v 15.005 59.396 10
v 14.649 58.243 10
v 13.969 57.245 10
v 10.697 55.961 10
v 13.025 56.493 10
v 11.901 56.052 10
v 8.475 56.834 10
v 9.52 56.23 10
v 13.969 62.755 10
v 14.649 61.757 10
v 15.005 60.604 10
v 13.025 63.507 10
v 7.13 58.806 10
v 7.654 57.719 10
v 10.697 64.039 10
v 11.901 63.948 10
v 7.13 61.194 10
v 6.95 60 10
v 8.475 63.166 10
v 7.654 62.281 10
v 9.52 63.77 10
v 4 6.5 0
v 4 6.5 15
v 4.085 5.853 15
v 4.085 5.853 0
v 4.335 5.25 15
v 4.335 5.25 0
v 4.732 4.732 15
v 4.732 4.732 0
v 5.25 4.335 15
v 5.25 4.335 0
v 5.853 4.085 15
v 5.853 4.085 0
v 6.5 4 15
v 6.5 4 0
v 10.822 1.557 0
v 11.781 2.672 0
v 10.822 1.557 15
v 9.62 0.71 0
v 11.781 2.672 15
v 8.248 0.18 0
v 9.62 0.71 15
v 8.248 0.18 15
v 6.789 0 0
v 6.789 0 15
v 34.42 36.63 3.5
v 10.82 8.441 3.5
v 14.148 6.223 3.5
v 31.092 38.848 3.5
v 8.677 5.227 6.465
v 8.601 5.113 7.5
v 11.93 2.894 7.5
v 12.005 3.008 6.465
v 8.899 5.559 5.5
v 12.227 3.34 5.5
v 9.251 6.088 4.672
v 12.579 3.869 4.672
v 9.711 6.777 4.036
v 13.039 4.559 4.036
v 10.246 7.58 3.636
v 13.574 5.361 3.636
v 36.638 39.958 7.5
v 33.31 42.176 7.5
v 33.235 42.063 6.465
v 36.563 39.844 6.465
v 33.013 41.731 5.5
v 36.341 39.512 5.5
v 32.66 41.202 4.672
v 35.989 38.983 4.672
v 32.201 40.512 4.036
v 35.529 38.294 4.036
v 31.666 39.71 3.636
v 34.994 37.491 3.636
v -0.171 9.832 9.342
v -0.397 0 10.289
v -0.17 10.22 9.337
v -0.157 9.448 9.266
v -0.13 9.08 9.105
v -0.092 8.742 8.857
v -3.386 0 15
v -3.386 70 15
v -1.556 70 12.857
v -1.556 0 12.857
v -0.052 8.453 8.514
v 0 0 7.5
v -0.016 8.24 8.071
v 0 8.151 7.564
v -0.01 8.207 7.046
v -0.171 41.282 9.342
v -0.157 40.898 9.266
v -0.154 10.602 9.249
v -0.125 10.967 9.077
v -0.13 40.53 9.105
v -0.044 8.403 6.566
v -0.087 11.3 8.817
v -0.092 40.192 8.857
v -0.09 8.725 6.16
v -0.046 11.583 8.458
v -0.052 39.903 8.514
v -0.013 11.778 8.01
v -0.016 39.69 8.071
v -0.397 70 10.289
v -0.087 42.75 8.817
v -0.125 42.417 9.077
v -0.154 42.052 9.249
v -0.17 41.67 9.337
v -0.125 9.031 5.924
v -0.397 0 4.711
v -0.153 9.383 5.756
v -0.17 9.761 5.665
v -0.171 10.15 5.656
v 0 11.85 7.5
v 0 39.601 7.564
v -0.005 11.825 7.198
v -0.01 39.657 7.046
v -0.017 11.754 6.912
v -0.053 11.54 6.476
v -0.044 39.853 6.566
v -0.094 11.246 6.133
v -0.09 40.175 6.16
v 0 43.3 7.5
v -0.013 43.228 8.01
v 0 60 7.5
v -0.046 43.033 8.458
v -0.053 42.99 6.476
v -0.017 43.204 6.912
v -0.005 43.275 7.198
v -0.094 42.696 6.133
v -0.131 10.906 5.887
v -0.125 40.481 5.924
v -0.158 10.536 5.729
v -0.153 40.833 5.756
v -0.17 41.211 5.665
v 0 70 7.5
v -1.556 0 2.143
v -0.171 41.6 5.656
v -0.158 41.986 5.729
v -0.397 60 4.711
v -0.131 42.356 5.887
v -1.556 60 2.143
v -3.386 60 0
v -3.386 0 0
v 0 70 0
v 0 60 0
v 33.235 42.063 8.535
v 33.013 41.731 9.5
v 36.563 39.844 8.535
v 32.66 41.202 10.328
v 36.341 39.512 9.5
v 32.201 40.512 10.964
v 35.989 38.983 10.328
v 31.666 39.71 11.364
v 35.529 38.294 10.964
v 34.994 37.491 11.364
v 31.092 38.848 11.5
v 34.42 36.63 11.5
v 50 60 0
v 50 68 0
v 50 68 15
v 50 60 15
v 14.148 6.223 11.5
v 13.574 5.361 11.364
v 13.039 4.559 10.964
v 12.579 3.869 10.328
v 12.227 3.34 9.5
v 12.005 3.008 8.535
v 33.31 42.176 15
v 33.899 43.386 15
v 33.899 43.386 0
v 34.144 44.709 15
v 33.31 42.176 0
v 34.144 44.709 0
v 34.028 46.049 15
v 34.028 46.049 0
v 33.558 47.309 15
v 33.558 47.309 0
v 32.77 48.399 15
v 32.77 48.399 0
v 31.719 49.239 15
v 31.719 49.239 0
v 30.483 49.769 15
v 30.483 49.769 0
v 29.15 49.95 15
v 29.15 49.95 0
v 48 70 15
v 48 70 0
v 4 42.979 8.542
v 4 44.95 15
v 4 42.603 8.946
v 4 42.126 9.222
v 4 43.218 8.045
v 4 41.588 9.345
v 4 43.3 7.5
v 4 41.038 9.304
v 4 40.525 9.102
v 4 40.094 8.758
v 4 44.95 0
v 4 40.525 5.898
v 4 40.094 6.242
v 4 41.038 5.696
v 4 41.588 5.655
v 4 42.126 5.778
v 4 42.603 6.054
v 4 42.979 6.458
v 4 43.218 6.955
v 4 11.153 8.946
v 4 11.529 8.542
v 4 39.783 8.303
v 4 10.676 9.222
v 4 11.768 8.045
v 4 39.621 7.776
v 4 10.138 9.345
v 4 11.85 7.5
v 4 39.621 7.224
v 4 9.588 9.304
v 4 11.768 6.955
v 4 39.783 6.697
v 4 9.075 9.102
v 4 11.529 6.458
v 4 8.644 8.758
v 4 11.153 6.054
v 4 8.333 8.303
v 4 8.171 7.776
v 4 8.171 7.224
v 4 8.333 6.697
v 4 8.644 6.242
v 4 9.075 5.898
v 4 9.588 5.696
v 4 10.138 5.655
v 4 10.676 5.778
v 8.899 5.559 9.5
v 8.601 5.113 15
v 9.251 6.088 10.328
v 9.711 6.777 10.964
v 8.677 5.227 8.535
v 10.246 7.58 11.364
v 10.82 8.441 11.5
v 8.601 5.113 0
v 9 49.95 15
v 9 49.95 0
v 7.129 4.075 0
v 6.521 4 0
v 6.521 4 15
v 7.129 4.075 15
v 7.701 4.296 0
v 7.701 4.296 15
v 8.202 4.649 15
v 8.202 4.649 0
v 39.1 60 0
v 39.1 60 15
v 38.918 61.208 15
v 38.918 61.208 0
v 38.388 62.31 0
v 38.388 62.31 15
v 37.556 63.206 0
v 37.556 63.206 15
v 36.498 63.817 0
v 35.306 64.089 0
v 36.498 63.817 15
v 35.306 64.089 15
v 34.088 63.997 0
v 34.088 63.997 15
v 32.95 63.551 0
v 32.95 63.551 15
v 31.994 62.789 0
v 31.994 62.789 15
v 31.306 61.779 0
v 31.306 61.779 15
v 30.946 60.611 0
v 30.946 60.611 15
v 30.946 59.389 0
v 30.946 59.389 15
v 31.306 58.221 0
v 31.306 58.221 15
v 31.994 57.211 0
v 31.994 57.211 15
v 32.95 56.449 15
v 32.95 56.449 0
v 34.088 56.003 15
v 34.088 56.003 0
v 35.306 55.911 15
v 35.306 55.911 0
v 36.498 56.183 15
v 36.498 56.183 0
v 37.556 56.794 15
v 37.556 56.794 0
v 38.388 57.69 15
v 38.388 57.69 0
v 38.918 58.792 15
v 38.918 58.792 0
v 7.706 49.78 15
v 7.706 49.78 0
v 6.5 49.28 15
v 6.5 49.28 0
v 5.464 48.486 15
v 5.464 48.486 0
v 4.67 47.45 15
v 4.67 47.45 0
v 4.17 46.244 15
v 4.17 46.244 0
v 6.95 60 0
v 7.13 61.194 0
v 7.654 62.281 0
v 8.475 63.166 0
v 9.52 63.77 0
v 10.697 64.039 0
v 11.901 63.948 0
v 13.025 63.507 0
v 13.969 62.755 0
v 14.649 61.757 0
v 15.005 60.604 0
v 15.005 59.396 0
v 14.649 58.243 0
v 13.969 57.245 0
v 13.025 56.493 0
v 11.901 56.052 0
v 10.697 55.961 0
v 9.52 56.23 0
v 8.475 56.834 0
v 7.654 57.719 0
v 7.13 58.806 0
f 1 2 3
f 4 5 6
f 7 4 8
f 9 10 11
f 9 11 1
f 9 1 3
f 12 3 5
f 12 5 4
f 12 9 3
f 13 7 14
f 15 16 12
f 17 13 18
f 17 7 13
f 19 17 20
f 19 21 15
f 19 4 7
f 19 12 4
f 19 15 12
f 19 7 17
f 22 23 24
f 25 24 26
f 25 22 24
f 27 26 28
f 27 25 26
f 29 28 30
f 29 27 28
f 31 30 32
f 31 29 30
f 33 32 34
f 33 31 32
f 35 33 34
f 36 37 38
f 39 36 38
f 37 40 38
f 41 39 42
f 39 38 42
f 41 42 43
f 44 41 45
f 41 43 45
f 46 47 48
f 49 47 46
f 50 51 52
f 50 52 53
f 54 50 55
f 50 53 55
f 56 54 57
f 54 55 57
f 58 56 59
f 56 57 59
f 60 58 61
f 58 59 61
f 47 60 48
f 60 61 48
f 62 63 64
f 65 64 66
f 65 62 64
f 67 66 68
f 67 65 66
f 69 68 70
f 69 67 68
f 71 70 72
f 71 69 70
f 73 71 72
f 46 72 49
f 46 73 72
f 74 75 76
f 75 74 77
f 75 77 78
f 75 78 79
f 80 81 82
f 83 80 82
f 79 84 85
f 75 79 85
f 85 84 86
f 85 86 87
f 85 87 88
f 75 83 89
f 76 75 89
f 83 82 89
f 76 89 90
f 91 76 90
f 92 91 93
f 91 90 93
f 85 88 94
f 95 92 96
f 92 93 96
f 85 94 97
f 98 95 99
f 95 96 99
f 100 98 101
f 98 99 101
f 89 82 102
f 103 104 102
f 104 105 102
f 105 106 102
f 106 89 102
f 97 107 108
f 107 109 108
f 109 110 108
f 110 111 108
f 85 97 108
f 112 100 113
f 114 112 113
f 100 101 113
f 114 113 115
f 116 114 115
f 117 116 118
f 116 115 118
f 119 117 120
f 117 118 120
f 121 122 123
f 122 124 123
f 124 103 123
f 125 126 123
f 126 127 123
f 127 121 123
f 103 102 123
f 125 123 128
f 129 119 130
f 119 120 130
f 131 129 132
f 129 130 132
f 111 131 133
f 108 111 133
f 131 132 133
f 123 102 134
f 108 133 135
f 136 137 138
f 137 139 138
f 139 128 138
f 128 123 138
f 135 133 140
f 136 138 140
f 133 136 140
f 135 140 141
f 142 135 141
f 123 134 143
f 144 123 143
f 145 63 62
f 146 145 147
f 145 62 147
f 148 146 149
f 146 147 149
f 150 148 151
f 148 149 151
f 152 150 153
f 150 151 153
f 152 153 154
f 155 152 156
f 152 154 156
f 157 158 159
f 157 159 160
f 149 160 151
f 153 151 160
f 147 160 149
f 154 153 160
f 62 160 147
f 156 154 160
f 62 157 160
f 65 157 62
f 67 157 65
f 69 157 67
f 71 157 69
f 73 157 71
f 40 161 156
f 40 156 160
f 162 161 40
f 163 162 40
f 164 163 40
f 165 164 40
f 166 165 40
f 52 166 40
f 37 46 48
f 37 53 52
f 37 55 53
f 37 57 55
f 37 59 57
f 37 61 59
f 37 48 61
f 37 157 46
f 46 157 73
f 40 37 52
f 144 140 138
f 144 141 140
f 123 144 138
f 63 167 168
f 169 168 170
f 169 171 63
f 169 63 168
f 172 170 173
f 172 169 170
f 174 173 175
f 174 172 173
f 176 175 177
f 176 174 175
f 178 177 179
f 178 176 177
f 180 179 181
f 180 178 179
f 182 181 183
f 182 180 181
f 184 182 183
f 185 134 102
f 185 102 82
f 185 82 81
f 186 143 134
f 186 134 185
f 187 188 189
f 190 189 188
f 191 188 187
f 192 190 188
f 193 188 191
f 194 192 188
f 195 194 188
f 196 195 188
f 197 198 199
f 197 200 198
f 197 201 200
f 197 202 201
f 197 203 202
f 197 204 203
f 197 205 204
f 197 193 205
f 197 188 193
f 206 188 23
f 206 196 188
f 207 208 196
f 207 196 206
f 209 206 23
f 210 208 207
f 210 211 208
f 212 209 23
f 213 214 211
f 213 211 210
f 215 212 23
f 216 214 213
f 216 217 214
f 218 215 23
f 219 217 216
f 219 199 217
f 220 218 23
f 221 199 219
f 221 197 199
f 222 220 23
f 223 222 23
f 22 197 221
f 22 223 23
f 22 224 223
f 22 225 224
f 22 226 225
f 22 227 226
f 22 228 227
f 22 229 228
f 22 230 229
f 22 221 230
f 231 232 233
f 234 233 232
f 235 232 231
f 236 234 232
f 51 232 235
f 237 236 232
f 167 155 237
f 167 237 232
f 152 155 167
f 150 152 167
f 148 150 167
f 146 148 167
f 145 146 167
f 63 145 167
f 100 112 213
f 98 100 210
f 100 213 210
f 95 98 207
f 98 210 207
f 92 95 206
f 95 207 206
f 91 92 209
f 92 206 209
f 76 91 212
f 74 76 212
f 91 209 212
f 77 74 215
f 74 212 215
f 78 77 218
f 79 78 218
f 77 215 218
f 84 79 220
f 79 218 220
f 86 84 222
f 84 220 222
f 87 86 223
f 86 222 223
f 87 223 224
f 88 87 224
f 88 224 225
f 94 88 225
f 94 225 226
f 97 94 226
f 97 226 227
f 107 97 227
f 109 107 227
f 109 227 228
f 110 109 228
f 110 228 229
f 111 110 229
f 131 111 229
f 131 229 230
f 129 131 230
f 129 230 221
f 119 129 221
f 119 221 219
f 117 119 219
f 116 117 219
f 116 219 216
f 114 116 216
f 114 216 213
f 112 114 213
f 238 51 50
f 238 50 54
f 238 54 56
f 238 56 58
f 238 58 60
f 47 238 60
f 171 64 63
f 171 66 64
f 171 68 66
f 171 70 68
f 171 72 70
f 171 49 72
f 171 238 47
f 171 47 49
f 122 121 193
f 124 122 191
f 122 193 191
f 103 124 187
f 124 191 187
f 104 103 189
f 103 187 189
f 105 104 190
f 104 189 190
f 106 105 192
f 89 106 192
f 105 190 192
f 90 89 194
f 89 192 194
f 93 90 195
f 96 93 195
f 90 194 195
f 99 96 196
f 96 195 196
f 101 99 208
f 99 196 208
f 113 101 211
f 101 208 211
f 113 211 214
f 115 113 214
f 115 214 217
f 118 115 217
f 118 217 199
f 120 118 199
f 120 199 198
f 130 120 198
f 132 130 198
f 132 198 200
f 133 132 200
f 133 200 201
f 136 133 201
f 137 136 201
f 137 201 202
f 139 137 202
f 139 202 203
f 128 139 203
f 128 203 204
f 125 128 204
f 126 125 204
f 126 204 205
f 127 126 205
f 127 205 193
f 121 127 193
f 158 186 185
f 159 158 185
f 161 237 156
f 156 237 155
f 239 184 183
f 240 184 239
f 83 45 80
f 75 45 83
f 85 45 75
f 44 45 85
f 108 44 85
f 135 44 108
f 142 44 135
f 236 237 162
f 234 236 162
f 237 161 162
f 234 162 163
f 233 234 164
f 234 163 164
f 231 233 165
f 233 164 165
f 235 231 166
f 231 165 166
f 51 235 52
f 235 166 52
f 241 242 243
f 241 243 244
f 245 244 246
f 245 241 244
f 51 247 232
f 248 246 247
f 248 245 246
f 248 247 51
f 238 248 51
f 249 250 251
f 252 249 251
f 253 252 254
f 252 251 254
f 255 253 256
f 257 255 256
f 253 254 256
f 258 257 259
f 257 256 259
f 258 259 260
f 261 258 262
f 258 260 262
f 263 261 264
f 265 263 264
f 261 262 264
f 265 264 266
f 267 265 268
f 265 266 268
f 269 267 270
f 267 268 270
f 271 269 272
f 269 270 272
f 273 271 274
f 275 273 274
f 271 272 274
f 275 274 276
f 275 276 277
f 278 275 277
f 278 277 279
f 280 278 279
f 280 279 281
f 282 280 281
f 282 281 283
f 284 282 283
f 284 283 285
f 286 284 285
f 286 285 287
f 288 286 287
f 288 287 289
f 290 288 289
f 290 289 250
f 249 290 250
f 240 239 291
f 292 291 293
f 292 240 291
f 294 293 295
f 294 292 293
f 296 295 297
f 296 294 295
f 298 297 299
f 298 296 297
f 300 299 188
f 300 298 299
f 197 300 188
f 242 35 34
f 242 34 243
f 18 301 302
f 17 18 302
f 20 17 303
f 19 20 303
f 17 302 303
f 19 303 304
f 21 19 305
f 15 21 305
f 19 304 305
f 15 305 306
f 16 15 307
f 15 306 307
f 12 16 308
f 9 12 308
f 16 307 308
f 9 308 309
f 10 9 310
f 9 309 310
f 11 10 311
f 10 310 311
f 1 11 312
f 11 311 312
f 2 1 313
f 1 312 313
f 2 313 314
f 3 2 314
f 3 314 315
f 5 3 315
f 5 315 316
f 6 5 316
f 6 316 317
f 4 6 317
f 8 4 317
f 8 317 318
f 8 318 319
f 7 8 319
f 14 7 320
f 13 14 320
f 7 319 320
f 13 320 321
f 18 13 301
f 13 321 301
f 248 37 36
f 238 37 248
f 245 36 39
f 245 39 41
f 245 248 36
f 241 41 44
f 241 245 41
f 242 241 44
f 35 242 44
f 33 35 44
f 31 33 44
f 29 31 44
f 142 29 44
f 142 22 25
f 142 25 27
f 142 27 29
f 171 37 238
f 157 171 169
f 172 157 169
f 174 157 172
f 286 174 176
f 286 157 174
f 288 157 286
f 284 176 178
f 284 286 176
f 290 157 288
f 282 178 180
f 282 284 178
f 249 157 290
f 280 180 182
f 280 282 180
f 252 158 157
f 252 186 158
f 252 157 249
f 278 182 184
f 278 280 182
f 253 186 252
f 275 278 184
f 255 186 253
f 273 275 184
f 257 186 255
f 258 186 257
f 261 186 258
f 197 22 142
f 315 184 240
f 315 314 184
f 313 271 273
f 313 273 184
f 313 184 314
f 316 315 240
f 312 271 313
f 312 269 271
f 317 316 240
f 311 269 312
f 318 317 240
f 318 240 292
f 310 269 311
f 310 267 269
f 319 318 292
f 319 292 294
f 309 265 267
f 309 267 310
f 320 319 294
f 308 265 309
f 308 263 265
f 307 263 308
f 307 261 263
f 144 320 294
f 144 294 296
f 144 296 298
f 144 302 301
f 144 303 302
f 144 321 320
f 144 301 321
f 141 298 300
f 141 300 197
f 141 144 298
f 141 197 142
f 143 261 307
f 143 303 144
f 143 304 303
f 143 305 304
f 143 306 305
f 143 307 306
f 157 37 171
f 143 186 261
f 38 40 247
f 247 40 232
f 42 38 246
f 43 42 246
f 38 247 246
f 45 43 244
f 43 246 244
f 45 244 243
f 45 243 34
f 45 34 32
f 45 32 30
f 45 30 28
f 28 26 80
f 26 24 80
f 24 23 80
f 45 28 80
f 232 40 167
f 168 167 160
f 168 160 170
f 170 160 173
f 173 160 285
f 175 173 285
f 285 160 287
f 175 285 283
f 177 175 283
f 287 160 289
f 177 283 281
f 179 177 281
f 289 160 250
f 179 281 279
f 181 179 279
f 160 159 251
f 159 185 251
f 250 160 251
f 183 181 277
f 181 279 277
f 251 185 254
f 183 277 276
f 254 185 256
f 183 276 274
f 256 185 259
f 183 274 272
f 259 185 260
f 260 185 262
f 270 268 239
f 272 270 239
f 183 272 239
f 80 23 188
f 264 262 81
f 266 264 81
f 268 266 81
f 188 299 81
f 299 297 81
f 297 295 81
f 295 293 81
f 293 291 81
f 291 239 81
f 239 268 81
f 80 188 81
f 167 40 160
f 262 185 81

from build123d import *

# Parameters (mm, degrees)
P_IDAT_VYSUNUT_M1_DEPTH  = 15
SKICA3_R                 = 4.1
ODEBRAT_VYSUNUT_M1_DEPTH = 88.321245983
SKICA4_R                 = 4.05
ODEBRAT_VYSUNUT_M2_DEPTH = 10
ODEBRAT_VYSUNUT_M3_DEPTH = 88.321245983
P_IDAT_VYSUNUT_M2_DEPTH  = 70
SKICA7_W                 = 3.385621722
SKICA7_H                 = 7.5
ODEBRAT_VYSUNUT_M5_DEPTH = 10
SKICA9_W                 = 8
SKICA9_H                 = 44.544482181
ODEBRAT_VYSUNUT_M6_DEPTH = 88.290898193
ZAOBLIT2_R               = 4
SKICA10_R                = 1.85
ODEBRAT_VYSUNUT_M7_DEPTH = 86.094065598
ZAOBLIT7_R               = 6
ZKOSEN_1_SIZE            = 2


with BuildPart() as part:
    # Skica1 → Přidat vysunutím1 (new body)
    with BuildSketch(Plane.XY):
        Polygon((0, 0), (0, 70), (50, 70), (50, 60), (10, 0), align=None)
    extrude(amount=P_IDAT_VYSUNUT_M1_DEPTH)

    # Skica3 → Odebrat vysunutím1 (cut, through all)
    with BuildSketch(Plane.XY.offset(15)):
        with Locations((35, 60)):
            Circle(SKICA3_R)
    extrude(amount=-ODEBRAT_VYSUNUT_M1_DEPTH, mode=Mode.SUBTRACT)

    # Skica4 → Odebrat vysunutím2 (cut)
    with BuildSketch(Plane(origin=(0, 0, 0), x_dir=(-1, 0, 0), z_dir=(0, 0, -1))):
        with Locations((-11, 60)):
            Circle(SKICA4_R)
    extrude(amount=-ODEBRAT_VYSUNUT_M2_DEPTH, mode=Mode.SUBTRACT)

    # Skica5 → Odebrat vysunutím3 (cut, through all)
    with BuildSketch(Plane(origin=(0, 0, 0), x_dir=(-1, 0, 0), z_dir=(0, 0, -1))):
        with BuildLine():
            Line((-29.15001284, 49.95), (-9, 49.95))
            ThreePointArc((-9, 49.95), (-5.464466094, 48.485533906), (-4, 44.95))
            Line((-4, 44.95), (-4, 6.5))
            ThreePointArc((-4, 6.5), (-4.732233047, 4.732233047), (-6.5, 4))
            Line((-6.5, 4), (-6.52130557, 4))
            ThreePointArc((-6.52130557, 4), (-7.700950384, 4.295813503), (-8.601431306, 5.113249509))
            Line((-8.601431306, 5.113249509), (-33.310264312, 42.176499019))
            ThreePointArc((-33.310264312, 42.176499019), (-33.558385834, 47.309289628), (-29.15001284, 49.95))
        make_face()
    extrude(amount=-ODEBRAT_VYSUNUT_M3_DEPTH, mode=Mode.SUBTRACT)

    # Skica6 → Přidat vysunutím2 (add)
    with BuildSketch(Plane(origin=(0, 70, 0), x_dir=(1, 0, 0), z_dir=(0, 1, 0))):
        with BuildLine():
            Line((3.452933226, 0), (3.452933226, -15))
            Line((3.452933226, -15), (-3.385621722, -15))
            ThreePointArc((-3.385621722, -15), (0, -7.5), (-3.385621722, 0))
            Line((-3.385621722, 0), (3.452933226, 0))
        make_face()
    extrude(amount=-P_IDAT_VYSUNUT_M2_DEPTH)

    # Skica7 → Odebrat vysunutím5 (cut)
    with BuildSketch(Plane(origin=(0, 70, 0), x_dir=(1, 0, 0), z_dir=(0, 1, 0))):
        with Locations((-1.692810861, -3.75)):
            Rectangle(SKICA7_W, SKICA7_H)
    extrude(amount=-ODEBRAT_VYSUNUT_M5_DEPTH, mode=Mode.SUBTRACT)

    # Skica9 → Odebrat vysunutím6 (cut, through all)
    with BuildSketch(Plane(origin=(3.594875746, -2.39658383, 0), x_dir=(0, 0, 1), z_dir=(-0.8320502943378435, 0.5547001962252294, 0))):
        with Locations((7.5, 31.297937483)):
            Rectangle(SKICA9_W, SKICA9_H)
    extrude(amount=-ODEBRAT_VYSUNUT_M6_DEPTH, mode=Mode.SUBTRACT)

    # Zaoblit2
    zaoblit2_edges = [part.edges().sort_by_distance(p)[0] for p in [
        (10.265531894, 4.003849117, 11.5),
        (10.265531894, 4.003849117, 3.5),
        (34.974364901, 41.067098626, 3.5),
        (34.974364901, 41.067098626, 11.5),
    ]]
    fillet(zaoblit2_edges, radius=ZAOBLIT2_R - 0.0001)  # a hair under: the kernel refuses the full size

    # Skica10 → Odebrat vysunutím7 (cut, through all)
    with BuildSketch(Plane(origin=(4, 0, 0), x_dir=(0, 0, -1), z_dir=(1, 0, 0))):
        with Locations(Location((-7.5, 10, 0), (0, 0, 90))):
            Circle(SKICA10_R)
        with Locations(Location((-7.5, 41.45, 0), (0, 0, 90))):
            Circle(SKICA10_R)
    extrude(amount=-ODEBRAT_VYSUNUT_M7_DEPTH, mode=Mode.SUBTRACT)

    # Zaoblit7
    zaoblit7_edges = [part.edges().sort_by_distance(p)[0] for p in [
        (10, 0, 7.5),
    ]]
    fillet(zaoblit7_edges, radius=ZAOBLIT7_R)

    # Zkosení1
    zkosen_1_edges = [part.edges().sort_by_distance(p)[0] for p in [
        (50, 70, 7.5),
    ]]
    chamfer(zkosen_1_edges, length=ZKOSEN_1_SIZE)


solid = part.part
